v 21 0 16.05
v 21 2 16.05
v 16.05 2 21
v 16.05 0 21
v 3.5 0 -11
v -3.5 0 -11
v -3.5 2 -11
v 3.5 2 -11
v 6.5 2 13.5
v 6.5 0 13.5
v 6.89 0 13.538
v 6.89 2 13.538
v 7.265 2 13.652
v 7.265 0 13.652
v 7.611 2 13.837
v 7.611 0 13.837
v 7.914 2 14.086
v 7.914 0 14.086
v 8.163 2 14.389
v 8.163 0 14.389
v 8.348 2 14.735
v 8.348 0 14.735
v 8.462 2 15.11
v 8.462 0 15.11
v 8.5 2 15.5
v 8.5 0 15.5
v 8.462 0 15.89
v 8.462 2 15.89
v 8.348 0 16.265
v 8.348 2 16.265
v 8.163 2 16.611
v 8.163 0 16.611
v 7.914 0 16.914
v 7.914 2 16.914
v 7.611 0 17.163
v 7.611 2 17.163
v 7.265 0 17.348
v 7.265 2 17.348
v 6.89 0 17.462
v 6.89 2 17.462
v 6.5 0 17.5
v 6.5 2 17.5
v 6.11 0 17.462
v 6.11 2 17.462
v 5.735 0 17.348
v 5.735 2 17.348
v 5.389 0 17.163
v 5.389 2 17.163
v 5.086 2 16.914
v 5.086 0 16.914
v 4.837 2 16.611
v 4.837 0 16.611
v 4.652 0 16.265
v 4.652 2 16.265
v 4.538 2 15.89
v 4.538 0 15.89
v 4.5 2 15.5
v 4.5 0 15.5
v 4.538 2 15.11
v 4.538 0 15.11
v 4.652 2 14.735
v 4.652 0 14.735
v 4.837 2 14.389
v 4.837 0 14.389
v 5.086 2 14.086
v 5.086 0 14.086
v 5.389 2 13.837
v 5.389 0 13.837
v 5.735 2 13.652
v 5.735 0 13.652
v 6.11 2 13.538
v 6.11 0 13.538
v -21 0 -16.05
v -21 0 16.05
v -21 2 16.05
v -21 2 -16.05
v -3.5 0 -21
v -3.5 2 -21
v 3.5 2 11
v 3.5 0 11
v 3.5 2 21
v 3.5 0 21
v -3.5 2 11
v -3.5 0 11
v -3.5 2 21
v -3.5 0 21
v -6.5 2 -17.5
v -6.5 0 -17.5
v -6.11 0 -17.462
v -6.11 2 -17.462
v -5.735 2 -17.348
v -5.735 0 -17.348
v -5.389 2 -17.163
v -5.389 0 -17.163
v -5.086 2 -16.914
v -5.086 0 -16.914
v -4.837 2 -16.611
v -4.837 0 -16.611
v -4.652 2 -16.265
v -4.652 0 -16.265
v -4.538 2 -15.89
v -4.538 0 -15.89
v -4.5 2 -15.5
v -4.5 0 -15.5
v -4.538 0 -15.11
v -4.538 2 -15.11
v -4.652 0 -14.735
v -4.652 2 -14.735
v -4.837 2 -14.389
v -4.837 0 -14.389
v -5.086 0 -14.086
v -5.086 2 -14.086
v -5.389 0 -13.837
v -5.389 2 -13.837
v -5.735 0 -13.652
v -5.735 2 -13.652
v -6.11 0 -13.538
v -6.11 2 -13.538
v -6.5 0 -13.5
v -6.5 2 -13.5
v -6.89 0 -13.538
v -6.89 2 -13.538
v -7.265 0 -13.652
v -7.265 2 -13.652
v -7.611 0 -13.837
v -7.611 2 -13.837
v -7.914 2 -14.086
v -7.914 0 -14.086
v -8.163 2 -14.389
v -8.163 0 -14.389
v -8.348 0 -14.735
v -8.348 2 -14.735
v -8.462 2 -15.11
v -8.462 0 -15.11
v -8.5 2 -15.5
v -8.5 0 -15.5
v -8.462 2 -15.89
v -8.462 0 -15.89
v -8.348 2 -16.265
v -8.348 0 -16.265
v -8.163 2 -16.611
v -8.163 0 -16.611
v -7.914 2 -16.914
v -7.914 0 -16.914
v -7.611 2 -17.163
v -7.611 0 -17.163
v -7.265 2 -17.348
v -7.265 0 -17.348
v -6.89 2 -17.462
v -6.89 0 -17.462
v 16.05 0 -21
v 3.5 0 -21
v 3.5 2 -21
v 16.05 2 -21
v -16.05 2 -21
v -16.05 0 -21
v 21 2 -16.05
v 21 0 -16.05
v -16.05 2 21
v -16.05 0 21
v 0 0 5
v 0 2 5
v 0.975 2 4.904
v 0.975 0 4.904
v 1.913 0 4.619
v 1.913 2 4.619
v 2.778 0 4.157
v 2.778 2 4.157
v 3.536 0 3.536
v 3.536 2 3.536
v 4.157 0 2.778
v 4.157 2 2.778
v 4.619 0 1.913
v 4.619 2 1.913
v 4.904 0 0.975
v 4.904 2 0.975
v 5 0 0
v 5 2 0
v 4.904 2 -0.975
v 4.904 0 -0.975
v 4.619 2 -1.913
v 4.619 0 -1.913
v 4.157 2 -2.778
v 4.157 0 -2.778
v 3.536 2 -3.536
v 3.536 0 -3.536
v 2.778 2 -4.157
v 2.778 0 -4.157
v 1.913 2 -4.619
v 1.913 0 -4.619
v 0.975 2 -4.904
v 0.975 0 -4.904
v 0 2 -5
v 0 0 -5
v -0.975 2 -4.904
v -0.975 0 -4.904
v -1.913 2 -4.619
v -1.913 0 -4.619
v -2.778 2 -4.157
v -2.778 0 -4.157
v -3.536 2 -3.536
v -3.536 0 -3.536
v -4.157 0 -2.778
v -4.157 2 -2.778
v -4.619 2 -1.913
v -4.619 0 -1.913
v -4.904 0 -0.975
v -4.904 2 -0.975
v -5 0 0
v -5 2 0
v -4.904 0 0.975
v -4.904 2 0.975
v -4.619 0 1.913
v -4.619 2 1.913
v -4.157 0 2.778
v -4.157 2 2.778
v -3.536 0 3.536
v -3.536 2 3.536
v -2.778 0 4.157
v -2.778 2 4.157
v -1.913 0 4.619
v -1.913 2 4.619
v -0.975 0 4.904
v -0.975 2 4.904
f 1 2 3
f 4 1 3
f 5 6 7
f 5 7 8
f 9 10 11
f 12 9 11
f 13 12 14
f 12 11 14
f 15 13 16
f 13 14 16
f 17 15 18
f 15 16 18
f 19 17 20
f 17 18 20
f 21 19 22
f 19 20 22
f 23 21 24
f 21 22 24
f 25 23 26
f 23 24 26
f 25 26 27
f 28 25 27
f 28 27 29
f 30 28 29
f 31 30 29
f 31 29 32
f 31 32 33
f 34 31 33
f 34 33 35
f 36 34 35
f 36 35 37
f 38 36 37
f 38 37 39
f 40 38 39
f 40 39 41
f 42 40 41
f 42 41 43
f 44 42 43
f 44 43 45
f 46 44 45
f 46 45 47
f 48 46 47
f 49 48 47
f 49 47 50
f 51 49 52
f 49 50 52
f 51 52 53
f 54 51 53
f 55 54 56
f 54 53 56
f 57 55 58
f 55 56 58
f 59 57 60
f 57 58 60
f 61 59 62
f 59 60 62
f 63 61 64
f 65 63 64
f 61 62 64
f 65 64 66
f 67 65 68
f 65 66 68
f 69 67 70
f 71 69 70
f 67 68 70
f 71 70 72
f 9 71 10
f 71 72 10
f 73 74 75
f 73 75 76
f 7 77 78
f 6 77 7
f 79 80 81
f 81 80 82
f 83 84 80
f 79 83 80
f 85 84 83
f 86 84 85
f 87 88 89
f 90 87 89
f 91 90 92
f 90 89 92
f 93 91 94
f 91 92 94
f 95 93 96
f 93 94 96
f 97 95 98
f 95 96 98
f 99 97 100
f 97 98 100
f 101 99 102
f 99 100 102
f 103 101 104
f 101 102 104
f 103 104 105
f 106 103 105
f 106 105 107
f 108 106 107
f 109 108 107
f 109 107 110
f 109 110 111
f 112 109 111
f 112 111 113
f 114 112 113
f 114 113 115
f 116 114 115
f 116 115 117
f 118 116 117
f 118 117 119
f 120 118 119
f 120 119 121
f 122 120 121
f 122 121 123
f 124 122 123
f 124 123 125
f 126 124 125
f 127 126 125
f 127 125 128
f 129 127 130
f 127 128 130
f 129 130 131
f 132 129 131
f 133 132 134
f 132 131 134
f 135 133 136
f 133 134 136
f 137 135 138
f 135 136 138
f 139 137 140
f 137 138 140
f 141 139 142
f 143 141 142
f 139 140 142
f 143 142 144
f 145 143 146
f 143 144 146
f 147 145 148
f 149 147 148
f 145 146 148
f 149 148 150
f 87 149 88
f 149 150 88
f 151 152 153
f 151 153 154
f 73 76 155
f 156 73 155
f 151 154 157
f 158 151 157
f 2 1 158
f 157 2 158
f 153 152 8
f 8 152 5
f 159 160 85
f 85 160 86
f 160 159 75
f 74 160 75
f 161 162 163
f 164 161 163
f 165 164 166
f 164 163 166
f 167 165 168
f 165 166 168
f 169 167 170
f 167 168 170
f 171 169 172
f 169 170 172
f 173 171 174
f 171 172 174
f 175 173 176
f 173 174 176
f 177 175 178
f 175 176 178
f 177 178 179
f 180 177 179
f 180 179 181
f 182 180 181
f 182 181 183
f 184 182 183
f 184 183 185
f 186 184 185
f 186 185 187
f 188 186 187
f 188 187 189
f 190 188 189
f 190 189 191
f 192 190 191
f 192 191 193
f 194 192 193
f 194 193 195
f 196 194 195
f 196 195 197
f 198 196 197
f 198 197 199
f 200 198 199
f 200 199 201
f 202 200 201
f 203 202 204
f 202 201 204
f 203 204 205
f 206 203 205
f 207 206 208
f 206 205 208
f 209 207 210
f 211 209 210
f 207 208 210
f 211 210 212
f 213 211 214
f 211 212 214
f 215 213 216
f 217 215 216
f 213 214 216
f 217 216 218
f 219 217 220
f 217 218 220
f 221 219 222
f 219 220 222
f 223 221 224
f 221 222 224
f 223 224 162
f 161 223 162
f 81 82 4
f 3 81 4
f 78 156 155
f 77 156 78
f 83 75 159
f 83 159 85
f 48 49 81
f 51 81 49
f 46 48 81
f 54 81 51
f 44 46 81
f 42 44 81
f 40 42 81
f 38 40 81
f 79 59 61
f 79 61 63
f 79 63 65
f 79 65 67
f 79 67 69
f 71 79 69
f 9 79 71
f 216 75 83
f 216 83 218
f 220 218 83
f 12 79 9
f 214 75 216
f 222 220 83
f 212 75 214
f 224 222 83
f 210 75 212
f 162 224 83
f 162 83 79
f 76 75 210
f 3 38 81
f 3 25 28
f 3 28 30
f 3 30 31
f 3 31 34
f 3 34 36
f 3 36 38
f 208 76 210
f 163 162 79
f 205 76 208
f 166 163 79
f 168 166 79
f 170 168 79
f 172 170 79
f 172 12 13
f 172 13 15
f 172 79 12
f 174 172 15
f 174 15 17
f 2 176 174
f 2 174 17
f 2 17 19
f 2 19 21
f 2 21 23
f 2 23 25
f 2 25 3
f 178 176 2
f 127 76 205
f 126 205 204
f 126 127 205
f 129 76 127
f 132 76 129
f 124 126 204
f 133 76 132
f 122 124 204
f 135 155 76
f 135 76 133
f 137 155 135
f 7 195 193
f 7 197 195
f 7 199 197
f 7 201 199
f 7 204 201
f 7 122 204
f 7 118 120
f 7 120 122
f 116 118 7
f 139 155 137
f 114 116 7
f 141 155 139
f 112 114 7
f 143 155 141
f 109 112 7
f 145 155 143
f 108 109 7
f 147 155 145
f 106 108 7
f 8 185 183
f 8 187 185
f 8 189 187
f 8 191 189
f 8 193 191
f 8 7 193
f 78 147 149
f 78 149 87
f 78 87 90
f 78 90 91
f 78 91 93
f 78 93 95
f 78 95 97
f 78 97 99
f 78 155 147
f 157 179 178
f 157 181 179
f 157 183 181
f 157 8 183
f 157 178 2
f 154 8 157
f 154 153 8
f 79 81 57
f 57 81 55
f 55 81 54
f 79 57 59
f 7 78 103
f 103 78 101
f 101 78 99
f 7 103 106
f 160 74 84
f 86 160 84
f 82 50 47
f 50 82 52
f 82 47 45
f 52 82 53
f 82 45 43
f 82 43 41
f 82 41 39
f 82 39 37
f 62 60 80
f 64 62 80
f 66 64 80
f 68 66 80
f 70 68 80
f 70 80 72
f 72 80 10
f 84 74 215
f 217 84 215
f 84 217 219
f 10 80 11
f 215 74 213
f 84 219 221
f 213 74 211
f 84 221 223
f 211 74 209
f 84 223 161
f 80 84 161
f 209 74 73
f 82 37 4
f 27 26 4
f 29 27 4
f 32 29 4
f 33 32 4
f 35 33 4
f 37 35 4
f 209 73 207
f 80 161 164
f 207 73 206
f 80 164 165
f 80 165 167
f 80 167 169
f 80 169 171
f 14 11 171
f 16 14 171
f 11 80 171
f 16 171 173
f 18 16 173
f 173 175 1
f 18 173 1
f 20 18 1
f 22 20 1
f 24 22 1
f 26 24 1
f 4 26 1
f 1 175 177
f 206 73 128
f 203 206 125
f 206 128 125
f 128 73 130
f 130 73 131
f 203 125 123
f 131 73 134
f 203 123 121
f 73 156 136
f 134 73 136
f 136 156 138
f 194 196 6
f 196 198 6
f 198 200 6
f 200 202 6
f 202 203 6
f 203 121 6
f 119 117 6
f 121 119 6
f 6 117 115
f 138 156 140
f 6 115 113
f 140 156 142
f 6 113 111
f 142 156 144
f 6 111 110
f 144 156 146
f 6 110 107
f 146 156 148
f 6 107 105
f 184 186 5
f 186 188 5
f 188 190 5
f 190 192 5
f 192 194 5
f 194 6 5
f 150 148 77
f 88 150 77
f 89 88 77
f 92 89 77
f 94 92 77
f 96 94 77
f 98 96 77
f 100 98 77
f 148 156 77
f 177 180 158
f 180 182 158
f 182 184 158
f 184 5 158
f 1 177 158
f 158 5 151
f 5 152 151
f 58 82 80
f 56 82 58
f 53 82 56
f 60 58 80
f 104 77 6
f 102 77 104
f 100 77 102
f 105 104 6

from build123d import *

# Parameters (mm, degrees)
SKETCH1_W           = 42
SKETCH1_H           = 42
BOSS_EXTRUDE1_DEPTH = 2
CUT_EXTRUDE1_DEPTH  = 10
SKETCH3_R           = 5
CUT_EXTRUDE2_DEPTH  = 10
SKETCH4_R           = 2
CUT_EXTRUDE3_DEPTH  = 10
SKETCH5_W           = 7
SKETCH5_H           = 10
CUT_EXTRUDE4_DEPTH  = 4


with BuildPart() as part:
    # Sketch1 → Boss-Extrude1 (new body)
    with BuildSketch(Plane(origin=(0, 0, 0), x_dir=(1, 0, 0), z_dir=(0, 1, 0))):
        Rectangle(SKETCH1_W, SKETCH1_H)
    extrude(amount=BOSS_EXTRUDE1_DEPTH)

    # Sketch2 → Cut-Extrude1 (cut)
    with BuildSketch(Plane(origin=(0, 2, 0), x_dir=(1, 0, 0), z_dir=(0, 1, 0))):
        Polygon((-16.050252532, 21), (-21, 21), (-21, 16.050252532), align=None)
        Polygon((21, 21), (16.050252532, 21), (21, 16.050252532), align=None)
        Polygon((21, -16.050252532), (16.050252532, -21), (21, -21), align=None)
        Polygon((-16.050252532, -21), (-21, -16.050252532), (-21, -21), align=None)
    extrude(amount=-CUT_EXTRUDE1_DEPTH, mode=Mode.SUBTRACT)

    # Sketch3 → Cut-Extrude2 (cut)
    with BuildSketch(Plane(origin=(0, 2, 0), x_dir=(1, 0, 0), z_dir=(0, 1, 0))):
        with Locations(Location((0, 0, 0), (0, 0, 270))):
            Circle(SKETCH3_R)
    extrude(amount=-CUT_EXTRUDE2_DEPTH, mode=Mode.SUBTRACT)

    # Sketch4 → Cut-Extrude3 (cut)
    with BuildSketch(Plane.XZ):
        with Locations(Location((6.5, 15.5, 0), (0, 0, 270))):
            Circle(SKETCH4_R)
        with Locations(Location((-6.5, -15.5, 0), (0, 0, 270))):
            Circle(SKETCH4_R)
    extrude(amount=-CUT_EXTRUDE3_DEPTH, mode=Mode.SUBTRACT)

    # Sketch5 → Cut-Extrude4 (cut)
    with BuildSketch(Plane.XZ):
        with Locations((0, -16)):
            Rectangle(SKETCH5_W, SKETCH5_H)
        with Locations((0, 16)):
            Rectangle(SKETCH5_W, SKETCH5_H)
    extrude(amount=-CUT_EXTRUDE4_DEPTH, mode=Mode.SUBTRACT)


solid = part.part
